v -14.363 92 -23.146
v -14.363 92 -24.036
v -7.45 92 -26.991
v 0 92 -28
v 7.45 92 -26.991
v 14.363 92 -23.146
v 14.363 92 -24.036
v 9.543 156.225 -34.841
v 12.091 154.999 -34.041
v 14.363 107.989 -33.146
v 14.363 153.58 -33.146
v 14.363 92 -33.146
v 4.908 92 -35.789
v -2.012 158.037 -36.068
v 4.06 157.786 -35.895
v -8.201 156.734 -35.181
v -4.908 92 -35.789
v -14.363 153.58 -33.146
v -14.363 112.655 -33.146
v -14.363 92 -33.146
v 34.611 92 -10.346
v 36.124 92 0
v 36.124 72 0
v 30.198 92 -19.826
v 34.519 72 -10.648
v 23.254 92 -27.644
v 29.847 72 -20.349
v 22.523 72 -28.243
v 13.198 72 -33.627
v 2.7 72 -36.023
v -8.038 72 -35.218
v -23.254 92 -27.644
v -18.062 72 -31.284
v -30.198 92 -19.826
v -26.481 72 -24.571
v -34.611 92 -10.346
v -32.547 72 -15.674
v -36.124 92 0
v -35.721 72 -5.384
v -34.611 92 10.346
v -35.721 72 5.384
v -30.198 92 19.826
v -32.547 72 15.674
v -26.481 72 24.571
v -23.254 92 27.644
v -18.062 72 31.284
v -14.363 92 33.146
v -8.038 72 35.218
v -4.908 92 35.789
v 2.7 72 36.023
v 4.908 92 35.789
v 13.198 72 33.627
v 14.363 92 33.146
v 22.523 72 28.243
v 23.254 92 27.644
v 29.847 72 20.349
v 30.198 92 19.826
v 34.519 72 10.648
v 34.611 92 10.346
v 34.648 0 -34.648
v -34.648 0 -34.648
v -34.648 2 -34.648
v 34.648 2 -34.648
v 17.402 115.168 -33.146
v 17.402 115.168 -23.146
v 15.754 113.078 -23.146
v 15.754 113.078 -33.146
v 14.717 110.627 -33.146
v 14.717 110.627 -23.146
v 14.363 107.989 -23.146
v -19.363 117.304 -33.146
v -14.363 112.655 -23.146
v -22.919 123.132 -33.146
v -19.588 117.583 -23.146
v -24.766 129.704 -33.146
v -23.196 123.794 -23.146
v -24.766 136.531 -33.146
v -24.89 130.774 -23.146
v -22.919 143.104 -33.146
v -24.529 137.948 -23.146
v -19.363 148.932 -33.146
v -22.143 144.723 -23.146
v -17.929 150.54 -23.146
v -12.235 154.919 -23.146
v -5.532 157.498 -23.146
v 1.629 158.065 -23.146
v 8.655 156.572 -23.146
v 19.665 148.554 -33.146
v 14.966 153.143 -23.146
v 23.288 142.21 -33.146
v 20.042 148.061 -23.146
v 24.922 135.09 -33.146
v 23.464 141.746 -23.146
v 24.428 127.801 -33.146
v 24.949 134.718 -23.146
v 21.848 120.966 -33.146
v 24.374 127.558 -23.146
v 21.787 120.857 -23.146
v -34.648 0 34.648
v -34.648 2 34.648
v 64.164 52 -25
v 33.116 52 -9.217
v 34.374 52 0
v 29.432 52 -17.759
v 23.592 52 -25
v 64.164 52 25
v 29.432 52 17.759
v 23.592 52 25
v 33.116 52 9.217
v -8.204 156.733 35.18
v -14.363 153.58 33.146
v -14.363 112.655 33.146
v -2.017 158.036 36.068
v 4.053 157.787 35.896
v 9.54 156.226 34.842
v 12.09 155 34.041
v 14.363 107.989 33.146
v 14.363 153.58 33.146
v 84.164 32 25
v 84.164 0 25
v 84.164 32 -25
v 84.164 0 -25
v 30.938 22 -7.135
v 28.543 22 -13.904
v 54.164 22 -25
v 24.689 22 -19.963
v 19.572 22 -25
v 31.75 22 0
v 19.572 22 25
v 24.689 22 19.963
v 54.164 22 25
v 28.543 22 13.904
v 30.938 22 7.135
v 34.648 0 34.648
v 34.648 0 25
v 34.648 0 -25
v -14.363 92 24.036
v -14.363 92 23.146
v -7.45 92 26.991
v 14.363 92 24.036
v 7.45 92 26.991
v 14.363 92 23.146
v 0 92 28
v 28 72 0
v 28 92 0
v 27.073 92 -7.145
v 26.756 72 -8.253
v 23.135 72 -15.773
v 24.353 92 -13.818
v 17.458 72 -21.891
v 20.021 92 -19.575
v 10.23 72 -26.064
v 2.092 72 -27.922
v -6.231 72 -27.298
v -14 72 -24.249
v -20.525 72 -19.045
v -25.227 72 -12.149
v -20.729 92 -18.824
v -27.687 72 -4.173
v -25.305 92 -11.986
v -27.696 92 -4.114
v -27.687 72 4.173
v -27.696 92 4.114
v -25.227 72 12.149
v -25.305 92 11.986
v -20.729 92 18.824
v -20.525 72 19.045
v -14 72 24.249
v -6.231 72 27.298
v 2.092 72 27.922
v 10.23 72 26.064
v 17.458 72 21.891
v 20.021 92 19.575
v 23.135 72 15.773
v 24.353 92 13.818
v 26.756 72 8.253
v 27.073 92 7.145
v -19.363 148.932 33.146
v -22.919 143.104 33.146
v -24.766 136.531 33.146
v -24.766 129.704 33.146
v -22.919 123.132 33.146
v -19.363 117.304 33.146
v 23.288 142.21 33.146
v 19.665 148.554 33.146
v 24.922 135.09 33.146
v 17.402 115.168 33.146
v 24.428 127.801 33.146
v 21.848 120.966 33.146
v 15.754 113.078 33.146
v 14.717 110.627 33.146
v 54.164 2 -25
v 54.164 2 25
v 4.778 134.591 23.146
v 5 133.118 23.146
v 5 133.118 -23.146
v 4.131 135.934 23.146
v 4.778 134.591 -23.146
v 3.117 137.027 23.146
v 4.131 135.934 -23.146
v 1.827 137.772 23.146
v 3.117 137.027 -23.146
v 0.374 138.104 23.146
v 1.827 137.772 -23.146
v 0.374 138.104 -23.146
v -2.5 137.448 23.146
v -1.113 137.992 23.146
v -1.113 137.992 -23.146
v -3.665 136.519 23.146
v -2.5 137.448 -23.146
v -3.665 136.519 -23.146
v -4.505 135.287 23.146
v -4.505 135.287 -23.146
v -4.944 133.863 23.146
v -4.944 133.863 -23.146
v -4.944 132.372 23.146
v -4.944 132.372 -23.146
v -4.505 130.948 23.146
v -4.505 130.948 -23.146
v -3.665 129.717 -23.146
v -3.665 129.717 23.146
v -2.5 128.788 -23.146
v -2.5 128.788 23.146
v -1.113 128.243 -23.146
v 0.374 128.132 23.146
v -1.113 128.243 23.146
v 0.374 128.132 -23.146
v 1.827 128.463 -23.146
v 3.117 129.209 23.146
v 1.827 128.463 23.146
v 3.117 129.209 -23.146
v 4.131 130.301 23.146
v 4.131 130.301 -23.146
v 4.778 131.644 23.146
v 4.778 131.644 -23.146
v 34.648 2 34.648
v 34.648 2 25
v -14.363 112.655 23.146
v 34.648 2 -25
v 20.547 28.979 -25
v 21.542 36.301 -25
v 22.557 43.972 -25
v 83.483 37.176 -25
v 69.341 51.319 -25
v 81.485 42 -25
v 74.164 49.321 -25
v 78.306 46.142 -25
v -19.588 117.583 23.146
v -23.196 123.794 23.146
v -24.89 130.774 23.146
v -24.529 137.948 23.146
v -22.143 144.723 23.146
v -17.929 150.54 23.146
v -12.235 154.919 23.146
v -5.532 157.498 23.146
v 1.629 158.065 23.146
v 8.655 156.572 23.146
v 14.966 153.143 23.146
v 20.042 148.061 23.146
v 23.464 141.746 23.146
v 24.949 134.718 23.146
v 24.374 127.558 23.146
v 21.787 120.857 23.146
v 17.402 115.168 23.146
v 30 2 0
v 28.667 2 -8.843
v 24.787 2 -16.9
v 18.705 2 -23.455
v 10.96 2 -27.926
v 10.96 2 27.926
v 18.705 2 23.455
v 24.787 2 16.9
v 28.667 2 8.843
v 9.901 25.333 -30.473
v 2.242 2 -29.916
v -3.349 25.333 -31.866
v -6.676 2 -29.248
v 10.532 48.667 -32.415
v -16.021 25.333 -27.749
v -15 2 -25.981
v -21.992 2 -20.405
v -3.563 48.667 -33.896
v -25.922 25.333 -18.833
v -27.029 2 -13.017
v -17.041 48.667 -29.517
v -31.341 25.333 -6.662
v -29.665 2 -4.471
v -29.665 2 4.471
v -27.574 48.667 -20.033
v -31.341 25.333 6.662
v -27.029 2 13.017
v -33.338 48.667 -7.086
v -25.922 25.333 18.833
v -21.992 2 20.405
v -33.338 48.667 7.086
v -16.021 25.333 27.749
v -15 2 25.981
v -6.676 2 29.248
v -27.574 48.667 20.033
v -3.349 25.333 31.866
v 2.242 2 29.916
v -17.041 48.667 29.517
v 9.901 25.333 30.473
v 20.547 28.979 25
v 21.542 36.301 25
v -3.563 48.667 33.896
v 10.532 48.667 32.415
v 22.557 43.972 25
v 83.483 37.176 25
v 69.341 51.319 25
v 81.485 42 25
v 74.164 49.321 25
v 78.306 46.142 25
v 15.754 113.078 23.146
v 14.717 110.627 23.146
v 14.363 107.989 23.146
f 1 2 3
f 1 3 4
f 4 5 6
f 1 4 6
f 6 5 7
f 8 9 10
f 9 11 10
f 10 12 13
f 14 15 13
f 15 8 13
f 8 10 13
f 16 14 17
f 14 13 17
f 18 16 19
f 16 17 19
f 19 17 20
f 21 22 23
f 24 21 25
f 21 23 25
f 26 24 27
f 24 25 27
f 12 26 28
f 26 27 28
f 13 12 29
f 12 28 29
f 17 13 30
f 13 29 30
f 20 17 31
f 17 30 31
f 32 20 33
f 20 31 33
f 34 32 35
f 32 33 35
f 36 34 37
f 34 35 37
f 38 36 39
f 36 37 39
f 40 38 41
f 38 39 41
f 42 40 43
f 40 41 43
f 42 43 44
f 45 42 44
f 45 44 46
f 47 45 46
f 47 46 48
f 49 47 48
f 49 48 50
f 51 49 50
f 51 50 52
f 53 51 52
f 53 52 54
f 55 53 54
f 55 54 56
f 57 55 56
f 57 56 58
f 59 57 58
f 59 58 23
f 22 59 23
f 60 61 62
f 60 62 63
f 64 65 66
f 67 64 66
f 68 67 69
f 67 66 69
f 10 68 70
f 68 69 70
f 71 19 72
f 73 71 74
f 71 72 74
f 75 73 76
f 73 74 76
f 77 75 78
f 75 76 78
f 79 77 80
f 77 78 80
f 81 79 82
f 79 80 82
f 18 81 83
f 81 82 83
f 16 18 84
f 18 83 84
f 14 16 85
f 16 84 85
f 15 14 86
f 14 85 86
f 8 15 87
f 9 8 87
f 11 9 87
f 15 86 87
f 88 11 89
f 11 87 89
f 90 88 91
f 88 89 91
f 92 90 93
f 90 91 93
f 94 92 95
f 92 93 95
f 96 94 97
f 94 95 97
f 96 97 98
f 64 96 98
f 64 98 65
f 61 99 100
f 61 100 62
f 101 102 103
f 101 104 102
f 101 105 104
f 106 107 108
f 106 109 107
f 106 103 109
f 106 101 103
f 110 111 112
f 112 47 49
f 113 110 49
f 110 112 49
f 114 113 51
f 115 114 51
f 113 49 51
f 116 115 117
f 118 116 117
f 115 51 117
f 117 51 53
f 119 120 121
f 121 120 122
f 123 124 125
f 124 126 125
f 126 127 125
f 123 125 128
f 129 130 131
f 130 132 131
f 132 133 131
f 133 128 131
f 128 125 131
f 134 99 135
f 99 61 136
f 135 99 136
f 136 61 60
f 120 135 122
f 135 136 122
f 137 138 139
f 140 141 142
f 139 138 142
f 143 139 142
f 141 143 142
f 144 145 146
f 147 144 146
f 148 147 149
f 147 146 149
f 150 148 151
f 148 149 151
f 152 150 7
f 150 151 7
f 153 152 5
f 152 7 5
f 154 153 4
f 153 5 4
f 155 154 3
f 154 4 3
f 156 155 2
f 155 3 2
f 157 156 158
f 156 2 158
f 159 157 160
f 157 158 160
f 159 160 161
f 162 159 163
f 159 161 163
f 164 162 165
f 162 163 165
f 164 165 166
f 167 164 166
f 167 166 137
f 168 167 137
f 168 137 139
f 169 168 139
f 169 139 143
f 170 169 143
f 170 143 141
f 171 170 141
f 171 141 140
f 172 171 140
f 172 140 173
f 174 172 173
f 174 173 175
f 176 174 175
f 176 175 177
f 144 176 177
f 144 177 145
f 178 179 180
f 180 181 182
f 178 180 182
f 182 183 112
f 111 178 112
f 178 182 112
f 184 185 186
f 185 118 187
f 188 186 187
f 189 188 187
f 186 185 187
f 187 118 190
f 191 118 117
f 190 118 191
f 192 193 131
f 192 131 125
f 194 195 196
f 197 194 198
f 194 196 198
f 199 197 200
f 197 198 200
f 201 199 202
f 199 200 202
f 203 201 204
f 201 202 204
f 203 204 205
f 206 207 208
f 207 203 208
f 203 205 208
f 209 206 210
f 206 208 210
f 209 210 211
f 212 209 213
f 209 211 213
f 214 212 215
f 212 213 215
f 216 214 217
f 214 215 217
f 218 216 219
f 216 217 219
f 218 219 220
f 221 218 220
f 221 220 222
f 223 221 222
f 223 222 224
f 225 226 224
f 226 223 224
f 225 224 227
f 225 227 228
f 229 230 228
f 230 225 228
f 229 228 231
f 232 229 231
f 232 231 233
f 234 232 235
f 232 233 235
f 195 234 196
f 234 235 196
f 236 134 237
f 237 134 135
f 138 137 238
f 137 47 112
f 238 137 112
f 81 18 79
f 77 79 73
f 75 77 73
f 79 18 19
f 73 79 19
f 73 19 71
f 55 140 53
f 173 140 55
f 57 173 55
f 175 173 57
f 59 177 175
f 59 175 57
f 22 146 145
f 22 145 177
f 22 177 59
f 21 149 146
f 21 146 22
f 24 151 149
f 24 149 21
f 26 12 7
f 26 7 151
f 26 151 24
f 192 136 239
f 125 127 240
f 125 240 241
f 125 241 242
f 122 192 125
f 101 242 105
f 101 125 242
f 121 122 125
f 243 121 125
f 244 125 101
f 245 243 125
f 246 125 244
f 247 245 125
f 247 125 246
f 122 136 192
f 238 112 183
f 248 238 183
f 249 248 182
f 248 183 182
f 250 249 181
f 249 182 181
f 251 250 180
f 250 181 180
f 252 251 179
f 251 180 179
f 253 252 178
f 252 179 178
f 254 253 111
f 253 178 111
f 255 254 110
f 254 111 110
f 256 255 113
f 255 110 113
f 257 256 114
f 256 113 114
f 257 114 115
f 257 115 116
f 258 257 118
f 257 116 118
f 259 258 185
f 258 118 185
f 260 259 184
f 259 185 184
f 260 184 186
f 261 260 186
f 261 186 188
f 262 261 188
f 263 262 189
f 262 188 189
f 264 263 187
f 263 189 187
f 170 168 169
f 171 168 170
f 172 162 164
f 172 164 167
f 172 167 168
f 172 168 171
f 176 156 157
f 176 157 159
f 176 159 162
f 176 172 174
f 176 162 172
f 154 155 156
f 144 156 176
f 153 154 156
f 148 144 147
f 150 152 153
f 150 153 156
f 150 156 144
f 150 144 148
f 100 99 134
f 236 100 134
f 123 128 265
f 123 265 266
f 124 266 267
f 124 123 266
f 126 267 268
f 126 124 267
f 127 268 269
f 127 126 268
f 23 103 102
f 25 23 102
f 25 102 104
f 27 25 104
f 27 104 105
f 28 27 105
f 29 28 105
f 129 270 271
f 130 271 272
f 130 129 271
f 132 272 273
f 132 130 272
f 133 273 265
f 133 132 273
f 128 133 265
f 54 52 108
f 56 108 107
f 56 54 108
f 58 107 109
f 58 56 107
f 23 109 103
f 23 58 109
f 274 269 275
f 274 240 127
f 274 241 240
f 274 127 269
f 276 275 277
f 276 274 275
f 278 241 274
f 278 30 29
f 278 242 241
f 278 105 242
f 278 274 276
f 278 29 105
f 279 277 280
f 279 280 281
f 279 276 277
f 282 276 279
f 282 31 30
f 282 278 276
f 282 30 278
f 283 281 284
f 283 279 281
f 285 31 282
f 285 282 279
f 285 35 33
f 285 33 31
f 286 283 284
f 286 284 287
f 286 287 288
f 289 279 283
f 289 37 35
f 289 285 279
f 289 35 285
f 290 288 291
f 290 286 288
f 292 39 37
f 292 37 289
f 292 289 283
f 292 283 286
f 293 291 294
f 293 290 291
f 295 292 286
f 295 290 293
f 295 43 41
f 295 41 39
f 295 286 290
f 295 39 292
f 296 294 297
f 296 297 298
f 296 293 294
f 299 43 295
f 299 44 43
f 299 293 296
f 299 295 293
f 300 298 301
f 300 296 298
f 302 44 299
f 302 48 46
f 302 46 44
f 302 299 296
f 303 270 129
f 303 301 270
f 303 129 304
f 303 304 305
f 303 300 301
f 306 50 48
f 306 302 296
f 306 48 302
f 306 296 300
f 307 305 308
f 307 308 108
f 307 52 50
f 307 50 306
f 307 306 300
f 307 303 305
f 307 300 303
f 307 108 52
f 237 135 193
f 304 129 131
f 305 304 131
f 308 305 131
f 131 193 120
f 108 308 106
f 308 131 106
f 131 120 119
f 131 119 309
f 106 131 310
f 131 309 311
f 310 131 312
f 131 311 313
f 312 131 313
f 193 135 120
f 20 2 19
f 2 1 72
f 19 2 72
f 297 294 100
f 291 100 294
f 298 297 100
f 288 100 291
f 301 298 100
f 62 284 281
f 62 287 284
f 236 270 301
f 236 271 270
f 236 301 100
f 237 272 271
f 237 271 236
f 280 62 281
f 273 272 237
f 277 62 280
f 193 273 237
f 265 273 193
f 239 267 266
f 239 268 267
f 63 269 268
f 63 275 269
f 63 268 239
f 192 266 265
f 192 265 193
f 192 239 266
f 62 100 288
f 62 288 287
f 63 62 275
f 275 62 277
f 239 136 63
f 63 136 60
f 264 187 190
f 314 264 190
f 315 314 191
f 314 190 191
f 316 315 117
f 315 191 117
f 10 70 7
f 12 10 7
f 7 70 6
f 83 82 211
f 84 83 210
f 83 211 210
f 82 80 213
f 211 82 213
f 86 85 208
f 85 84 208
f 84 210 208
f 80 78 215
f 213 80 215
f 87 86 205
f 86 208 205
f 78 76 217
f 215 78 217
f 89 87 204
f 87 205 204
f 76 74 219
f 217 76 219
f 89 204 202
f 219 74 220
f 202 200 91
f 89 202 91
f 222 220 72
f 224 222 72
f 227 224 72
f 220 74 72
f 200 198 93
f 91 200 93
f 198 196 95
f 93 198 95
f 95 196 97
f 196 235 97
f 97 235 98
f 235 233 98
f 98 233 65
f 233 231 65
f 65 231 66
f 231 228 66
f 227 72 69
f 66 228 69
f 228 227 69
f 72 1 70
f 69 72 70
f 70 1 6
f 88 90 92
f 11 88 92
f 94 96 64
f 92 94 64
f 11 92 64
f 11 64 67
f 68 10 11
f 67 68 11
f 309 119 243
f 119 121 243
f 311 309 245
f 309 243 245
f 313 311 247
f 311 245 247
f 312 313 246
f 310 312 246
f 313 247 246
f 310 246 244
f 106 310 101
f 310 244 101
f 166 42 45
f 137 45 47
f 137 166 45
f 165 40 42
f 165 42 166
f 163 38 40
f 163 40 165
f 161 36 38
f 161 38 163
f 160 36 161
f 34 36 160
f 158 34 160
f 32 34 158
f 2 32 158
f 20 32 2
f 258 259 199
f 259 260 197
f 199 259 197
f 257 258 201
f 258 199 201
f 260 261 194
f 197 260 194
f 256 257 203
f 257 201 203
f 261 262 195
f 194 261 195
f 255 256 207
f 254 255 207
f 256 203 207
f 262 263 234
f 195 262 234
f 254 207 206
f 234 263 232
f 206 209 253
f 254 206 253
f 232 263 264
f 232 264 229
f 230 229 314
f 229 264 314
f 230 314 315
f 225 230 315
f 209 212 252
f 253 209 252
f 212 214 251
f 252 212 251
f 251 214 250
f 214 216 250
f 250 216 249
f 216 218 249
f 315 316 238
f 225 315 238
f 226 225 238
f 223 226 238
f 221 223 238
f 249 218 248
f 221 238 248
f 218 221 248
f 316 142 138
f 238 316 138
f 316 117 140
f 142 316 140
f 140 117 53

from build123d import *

# Parameters (mm, degrees)
SKETCH1_W                 = 69.296350976
SKETCH1_H                 = 69.296350976
SKETCH1_W_2               = 49.515978472
SKETCH1_H_2               = 50
BOSS_EXTRUDE1_DEPTH       = 2
SKETCH2_R                 = 30
BOSS_EXTRUDE2_DEPTH       = 70
BOSS_EXTRUDE2_TAPER       = -5
SKETCH3_R                 = 36.124206447
BOSS_EXTRUDE3_DEPTH       = 20
SKETCH4_R                 = 28
CUT_EXTRUDE2_DEPTH        = 20
SKETCH5_W                 = 30
SKETCH5_H                 = 50
BOSS_EXTRUDE4_DEPTH       = 50
SKETCH6_W                 = 50
SKETCH6_H                 = 30
BOSS_EXTRUDE5_DEPTH       = 40
FILLET1_R                 = 20
BOSS_EXTRUDE11_DEPTH      = 70
CUT_EXTRUDE22_DEPTH       = 70
CUT_EXTRUDE22_DEPTH_BACK  = 70
SKETCH22_R                = 5
BOSS_EXTRUDE12_DEPTH      = 51
BOSS_EXTRUDE12_DEPTH_BACK = 2


with BuildPart() as part:
    # Sketch1 → Boss-Extrude1 (new body)
    with BuildSketch(Plane(origin=(0, 0, 0), x_dir=(1, 0, 0), z_dir=(0, 1, 0))):
        Rectangle(SKETCH1_W, SKETCH1_H)
        with Locations((59.406164724, 0)):
            Rectangle(SKETCH1_W_2, SKETCH1_H_2)
    extrude(amount=BOSS_EXTRUDE1_DEPTH)

    # Sketch2 → Boss-Extrude2 (add)
    with BuildSketch(Plane(origin=(0, 2, 0), x_dir=(1, 0, 0), z_dir=(0, 1, 0))):
        Circle(SKETCH2_R)
    extrude(amount=BOSS_EXTRUDE2_DEPTH, taper=BOSS_EXTRUDE2_TAPER)

    # Sketch3 → Boss-Extrude3 (add)
    with BuildSketch(Plane(origin=(0, 72, 0), x_dir=(1, 0, 0), z_dir=(0, 1, 0))):
        Circle(SKETCH3_R)
    extrude(amount=BOSS_EXTRUDE3_DEPTH)

    # Sketch4 → Cut-Extrude2 (cut)
    with BuildSketch(Plane(origin=(0, 92, 0), x_dir=(1, 0, 0), z_dir=(0, 1, 0))):
        Circle(SKETCH4_R)
    extrude(amount=-CUT_EXTRUDE2_DEPTH, mode=Mode.SUBTRACT)

    # Sketch5 → Boss-Extrude4 (add)
    with BuildSketch(Plane(origin=(0, 2, 0), x_dir=(1, 0, 0), z_dir=(0, 1, 0))):
        with Locations((69.16415396, 0)):
            Rectangle(SKETCH5_W, SKETCH5_H)
    extrude(amount=BOSS_EXTRUDE4_DEPTH)

    # Sketch6 → Boss-Extrude5 (add)
    with BuildSketch(Plane.ZY.offset(-54.16415396)):
        with Locations((0, 37)):
            Rectangle(SKETCH6_W, SKETCH6_H)
    extrude(amount=BOSS_EXTRUDE5_DEPTH)

    # Fillet1
    fillet1_edges = [part.edges().sort_by_distance(p)[0] for p in [
        (84.16415396, 52, 0),
    ]]
    fillet(fillet1_edges, radius=FILLET1_R)

    # Sketch7 → Boss-Extrude11 (add)
    with BuildSketch(Plane(origin=(0, 92, 0), x_dir=(1, 0, 0), z_dir=(0, 1, 0))):
        with BuildLine():
            Line((27.734618886, 23.14625686), (38.570246087, 23.14625686))
            Line((38.570246087, 23.14625686), (38.570246087, 33.14625686))
            Line((38.570246087, 33.14625686), (14.36258847, 33.14625686))
            ThreePointArc((14.36258847, 33.14625686), (21.634318034, 28.929475879), (27.734618886, 23.14625686))
        make_face()
        with BuildLine():
            ThreePointArc((-14.36258847, 33.14625686), (-21.634318034, 28.929475879), (-27.734618886, 23.14625686))
            Line((-27.734618886, 23.14625686), (-15.755976433, 23.14625686))
            ThreePointArc((-15.755976433, 23.14625686), (0, 28), (15.755976433, 23.14625686))
            Line((15.755976433, 23.14625686), (27.734618886, 23.14625686))
            ThreePointArc((27.734618886, 23.14625686), (21.634318034, 28.929475879), (14.36258847, 33.14625686))
            Line((14.36258847, 33.14625686), (-14.36258847, 33.14625686))
        make_face()
        with BuildLine():
            Line((-37.772768209, 23.14625686), (-27.734618886, 23.14625686))
            ThreePointArc((-27.734618886, 23.14625686), (-21.634318034, 28.929475879), (-14.36258847, 33.14625686))
            Line((-14.36258847, 33.14625686), (-37.772768209, 33.14625686))
            Line((-37.772768209, 33.14625686), (-37.772768209, 23.14625686))
        make_face()
        with BuildLine():
            ThreePointArc((14.36258847, 33.14625686), (0, 36.124206447), (-14.36258847, 33.14625686))
            Line((-14.36258847, 33.14625686), (14.36258847, 33.14625686))
        make_face()
        with BuildLine():
            ThreePointArc((15.755976433, 23.14625686), (0, 28), (-15.755976433, 23.14625686))
            Line((-15.755976433, 23.14625686), (15.755976433, 23.14625686))
        make_face()
        with BuildLine():
            Line((-37.772768209, -33.14625686), (-14.36258847, -33.14625686))
            ThreePointArc((-14.36258847, -33.14625686), (-21.634318034, -28.929475879), (-27.734618886, -23.14625686))
            Line((-27.734618886, -23.14625686), (-37.772768209, -23.14625686))
            Line((-37.772768209, -23.14625686), (-37.772768209, -33.14625686))
        make_face()
        with BuildLine():
            Line((-14.36258847, -33.14625686), (14.36258847, -33.14625686))
            ThreePointArc((14.36258847, -33.14625686), (21.634318034, -28.929475879), (27.734618886, -23.14625686))
            Line((27.734618886, -23.14625686), (15.755976433, -23.14625686))
            ThreePointArc((15.755976433, -23.14625686), (0, -28), (-15.755976433, -23.14625686))
            Line((-15.755976433, -23.14625686), (-27.734618886, -23.14625686))
            ThreePointArc((-27.734618886, -23.14625686), (-21.634318034, -28.929475879), (-14.36258847, -33.14625686))
        make_face()
        with BuildLine():
            ThreePointArc((27.734618886, -23.14625686), (21.634318034, -28.929475879), (14.36258847, -33.14625686))
            Line((14.36258847, -33.14625686), (38.570246087, -33.14625686))
            Line((38.570246087, -33.14625686), (38.570246087, -23.14625686))
            Line((38.570246087, -23.14625686), (27.734618886, -23.14625686))
        make_face()
        with BuildLine():
            ThreePointArc((-15.755976433, -23.14625686), (0, -28), (15.755976433, -23.14625686))
            Line((15.755976433, -23.14625686), (-15.755976433, -23.14625686))
        make_face()
        with BuildLine():
            ThreePointArc((-14.36258847, -33.14625686), (0, -36.124206447), (14.36258847, -33.14625686))
            Line((14.36258847, -33.14625686), (-14.36258847, -33.14625686))
        make_face()
    extrude(amount=BOSS_EXTRUDE11_DEPTH)

    # Sketch20 → Cut-Extrude22 (cut, two sides)
    with BuildSketch(Plane.XY.offset(33.14625686)) as cut_extrude22_sk:
        with BuildLine():
            Line((-14.36258847, 92), (-14.36258847, 112.655146554))
            ThreePointArc((-14.36258847, 112.655146554), (-1.971914178, 158.039808748), (17.401848907, 115.168446794))
            ThreePointArc((17.401848907, 115.168446794), (15.153696147, 111.886989388), (14.36258847, 107.988745913))
            Line((14.36258847, 107.988745913), (14.36258847, 92))
            Line((14.36258847, 92), (38.570246087, 92))
            Line((38.570246087, 92), (38.570246087, 162))
            Line((38.570246087, 162), (-37.772768209, 162))
            Line((-37.772768209, 162), (-37.772768209, 92))
            Line((-37.772768209, 92), (-14.36258847, 92))
        make_face()
    extrude(amount=CUT_EXTRUDE22_DEPTH, mode=Mode.SUBTRACT)
    extrude(cut_extrude22_sk.sketch, amount=-CUT_EXTRUDE22_DEPTH_BACK, mode=Mode.SUBTRACT)

    # Sketch22 → Boss-Extrude12 (add, two sides)
    with BuildSketch(Plane.XY.offset(-23.14625686)) as boss_extrude12_sk:
        with Locations((0, 133.117698996)):
            Circle(SKETCH22_R)
    extrude(amount=BOSS_EXTRUDE12_DEPTH)
    extrude(boss_extrude12_sk.sketch, amount=-BOSS_EXTRUDE12_DEPTH_BACK)


solid = part.part
